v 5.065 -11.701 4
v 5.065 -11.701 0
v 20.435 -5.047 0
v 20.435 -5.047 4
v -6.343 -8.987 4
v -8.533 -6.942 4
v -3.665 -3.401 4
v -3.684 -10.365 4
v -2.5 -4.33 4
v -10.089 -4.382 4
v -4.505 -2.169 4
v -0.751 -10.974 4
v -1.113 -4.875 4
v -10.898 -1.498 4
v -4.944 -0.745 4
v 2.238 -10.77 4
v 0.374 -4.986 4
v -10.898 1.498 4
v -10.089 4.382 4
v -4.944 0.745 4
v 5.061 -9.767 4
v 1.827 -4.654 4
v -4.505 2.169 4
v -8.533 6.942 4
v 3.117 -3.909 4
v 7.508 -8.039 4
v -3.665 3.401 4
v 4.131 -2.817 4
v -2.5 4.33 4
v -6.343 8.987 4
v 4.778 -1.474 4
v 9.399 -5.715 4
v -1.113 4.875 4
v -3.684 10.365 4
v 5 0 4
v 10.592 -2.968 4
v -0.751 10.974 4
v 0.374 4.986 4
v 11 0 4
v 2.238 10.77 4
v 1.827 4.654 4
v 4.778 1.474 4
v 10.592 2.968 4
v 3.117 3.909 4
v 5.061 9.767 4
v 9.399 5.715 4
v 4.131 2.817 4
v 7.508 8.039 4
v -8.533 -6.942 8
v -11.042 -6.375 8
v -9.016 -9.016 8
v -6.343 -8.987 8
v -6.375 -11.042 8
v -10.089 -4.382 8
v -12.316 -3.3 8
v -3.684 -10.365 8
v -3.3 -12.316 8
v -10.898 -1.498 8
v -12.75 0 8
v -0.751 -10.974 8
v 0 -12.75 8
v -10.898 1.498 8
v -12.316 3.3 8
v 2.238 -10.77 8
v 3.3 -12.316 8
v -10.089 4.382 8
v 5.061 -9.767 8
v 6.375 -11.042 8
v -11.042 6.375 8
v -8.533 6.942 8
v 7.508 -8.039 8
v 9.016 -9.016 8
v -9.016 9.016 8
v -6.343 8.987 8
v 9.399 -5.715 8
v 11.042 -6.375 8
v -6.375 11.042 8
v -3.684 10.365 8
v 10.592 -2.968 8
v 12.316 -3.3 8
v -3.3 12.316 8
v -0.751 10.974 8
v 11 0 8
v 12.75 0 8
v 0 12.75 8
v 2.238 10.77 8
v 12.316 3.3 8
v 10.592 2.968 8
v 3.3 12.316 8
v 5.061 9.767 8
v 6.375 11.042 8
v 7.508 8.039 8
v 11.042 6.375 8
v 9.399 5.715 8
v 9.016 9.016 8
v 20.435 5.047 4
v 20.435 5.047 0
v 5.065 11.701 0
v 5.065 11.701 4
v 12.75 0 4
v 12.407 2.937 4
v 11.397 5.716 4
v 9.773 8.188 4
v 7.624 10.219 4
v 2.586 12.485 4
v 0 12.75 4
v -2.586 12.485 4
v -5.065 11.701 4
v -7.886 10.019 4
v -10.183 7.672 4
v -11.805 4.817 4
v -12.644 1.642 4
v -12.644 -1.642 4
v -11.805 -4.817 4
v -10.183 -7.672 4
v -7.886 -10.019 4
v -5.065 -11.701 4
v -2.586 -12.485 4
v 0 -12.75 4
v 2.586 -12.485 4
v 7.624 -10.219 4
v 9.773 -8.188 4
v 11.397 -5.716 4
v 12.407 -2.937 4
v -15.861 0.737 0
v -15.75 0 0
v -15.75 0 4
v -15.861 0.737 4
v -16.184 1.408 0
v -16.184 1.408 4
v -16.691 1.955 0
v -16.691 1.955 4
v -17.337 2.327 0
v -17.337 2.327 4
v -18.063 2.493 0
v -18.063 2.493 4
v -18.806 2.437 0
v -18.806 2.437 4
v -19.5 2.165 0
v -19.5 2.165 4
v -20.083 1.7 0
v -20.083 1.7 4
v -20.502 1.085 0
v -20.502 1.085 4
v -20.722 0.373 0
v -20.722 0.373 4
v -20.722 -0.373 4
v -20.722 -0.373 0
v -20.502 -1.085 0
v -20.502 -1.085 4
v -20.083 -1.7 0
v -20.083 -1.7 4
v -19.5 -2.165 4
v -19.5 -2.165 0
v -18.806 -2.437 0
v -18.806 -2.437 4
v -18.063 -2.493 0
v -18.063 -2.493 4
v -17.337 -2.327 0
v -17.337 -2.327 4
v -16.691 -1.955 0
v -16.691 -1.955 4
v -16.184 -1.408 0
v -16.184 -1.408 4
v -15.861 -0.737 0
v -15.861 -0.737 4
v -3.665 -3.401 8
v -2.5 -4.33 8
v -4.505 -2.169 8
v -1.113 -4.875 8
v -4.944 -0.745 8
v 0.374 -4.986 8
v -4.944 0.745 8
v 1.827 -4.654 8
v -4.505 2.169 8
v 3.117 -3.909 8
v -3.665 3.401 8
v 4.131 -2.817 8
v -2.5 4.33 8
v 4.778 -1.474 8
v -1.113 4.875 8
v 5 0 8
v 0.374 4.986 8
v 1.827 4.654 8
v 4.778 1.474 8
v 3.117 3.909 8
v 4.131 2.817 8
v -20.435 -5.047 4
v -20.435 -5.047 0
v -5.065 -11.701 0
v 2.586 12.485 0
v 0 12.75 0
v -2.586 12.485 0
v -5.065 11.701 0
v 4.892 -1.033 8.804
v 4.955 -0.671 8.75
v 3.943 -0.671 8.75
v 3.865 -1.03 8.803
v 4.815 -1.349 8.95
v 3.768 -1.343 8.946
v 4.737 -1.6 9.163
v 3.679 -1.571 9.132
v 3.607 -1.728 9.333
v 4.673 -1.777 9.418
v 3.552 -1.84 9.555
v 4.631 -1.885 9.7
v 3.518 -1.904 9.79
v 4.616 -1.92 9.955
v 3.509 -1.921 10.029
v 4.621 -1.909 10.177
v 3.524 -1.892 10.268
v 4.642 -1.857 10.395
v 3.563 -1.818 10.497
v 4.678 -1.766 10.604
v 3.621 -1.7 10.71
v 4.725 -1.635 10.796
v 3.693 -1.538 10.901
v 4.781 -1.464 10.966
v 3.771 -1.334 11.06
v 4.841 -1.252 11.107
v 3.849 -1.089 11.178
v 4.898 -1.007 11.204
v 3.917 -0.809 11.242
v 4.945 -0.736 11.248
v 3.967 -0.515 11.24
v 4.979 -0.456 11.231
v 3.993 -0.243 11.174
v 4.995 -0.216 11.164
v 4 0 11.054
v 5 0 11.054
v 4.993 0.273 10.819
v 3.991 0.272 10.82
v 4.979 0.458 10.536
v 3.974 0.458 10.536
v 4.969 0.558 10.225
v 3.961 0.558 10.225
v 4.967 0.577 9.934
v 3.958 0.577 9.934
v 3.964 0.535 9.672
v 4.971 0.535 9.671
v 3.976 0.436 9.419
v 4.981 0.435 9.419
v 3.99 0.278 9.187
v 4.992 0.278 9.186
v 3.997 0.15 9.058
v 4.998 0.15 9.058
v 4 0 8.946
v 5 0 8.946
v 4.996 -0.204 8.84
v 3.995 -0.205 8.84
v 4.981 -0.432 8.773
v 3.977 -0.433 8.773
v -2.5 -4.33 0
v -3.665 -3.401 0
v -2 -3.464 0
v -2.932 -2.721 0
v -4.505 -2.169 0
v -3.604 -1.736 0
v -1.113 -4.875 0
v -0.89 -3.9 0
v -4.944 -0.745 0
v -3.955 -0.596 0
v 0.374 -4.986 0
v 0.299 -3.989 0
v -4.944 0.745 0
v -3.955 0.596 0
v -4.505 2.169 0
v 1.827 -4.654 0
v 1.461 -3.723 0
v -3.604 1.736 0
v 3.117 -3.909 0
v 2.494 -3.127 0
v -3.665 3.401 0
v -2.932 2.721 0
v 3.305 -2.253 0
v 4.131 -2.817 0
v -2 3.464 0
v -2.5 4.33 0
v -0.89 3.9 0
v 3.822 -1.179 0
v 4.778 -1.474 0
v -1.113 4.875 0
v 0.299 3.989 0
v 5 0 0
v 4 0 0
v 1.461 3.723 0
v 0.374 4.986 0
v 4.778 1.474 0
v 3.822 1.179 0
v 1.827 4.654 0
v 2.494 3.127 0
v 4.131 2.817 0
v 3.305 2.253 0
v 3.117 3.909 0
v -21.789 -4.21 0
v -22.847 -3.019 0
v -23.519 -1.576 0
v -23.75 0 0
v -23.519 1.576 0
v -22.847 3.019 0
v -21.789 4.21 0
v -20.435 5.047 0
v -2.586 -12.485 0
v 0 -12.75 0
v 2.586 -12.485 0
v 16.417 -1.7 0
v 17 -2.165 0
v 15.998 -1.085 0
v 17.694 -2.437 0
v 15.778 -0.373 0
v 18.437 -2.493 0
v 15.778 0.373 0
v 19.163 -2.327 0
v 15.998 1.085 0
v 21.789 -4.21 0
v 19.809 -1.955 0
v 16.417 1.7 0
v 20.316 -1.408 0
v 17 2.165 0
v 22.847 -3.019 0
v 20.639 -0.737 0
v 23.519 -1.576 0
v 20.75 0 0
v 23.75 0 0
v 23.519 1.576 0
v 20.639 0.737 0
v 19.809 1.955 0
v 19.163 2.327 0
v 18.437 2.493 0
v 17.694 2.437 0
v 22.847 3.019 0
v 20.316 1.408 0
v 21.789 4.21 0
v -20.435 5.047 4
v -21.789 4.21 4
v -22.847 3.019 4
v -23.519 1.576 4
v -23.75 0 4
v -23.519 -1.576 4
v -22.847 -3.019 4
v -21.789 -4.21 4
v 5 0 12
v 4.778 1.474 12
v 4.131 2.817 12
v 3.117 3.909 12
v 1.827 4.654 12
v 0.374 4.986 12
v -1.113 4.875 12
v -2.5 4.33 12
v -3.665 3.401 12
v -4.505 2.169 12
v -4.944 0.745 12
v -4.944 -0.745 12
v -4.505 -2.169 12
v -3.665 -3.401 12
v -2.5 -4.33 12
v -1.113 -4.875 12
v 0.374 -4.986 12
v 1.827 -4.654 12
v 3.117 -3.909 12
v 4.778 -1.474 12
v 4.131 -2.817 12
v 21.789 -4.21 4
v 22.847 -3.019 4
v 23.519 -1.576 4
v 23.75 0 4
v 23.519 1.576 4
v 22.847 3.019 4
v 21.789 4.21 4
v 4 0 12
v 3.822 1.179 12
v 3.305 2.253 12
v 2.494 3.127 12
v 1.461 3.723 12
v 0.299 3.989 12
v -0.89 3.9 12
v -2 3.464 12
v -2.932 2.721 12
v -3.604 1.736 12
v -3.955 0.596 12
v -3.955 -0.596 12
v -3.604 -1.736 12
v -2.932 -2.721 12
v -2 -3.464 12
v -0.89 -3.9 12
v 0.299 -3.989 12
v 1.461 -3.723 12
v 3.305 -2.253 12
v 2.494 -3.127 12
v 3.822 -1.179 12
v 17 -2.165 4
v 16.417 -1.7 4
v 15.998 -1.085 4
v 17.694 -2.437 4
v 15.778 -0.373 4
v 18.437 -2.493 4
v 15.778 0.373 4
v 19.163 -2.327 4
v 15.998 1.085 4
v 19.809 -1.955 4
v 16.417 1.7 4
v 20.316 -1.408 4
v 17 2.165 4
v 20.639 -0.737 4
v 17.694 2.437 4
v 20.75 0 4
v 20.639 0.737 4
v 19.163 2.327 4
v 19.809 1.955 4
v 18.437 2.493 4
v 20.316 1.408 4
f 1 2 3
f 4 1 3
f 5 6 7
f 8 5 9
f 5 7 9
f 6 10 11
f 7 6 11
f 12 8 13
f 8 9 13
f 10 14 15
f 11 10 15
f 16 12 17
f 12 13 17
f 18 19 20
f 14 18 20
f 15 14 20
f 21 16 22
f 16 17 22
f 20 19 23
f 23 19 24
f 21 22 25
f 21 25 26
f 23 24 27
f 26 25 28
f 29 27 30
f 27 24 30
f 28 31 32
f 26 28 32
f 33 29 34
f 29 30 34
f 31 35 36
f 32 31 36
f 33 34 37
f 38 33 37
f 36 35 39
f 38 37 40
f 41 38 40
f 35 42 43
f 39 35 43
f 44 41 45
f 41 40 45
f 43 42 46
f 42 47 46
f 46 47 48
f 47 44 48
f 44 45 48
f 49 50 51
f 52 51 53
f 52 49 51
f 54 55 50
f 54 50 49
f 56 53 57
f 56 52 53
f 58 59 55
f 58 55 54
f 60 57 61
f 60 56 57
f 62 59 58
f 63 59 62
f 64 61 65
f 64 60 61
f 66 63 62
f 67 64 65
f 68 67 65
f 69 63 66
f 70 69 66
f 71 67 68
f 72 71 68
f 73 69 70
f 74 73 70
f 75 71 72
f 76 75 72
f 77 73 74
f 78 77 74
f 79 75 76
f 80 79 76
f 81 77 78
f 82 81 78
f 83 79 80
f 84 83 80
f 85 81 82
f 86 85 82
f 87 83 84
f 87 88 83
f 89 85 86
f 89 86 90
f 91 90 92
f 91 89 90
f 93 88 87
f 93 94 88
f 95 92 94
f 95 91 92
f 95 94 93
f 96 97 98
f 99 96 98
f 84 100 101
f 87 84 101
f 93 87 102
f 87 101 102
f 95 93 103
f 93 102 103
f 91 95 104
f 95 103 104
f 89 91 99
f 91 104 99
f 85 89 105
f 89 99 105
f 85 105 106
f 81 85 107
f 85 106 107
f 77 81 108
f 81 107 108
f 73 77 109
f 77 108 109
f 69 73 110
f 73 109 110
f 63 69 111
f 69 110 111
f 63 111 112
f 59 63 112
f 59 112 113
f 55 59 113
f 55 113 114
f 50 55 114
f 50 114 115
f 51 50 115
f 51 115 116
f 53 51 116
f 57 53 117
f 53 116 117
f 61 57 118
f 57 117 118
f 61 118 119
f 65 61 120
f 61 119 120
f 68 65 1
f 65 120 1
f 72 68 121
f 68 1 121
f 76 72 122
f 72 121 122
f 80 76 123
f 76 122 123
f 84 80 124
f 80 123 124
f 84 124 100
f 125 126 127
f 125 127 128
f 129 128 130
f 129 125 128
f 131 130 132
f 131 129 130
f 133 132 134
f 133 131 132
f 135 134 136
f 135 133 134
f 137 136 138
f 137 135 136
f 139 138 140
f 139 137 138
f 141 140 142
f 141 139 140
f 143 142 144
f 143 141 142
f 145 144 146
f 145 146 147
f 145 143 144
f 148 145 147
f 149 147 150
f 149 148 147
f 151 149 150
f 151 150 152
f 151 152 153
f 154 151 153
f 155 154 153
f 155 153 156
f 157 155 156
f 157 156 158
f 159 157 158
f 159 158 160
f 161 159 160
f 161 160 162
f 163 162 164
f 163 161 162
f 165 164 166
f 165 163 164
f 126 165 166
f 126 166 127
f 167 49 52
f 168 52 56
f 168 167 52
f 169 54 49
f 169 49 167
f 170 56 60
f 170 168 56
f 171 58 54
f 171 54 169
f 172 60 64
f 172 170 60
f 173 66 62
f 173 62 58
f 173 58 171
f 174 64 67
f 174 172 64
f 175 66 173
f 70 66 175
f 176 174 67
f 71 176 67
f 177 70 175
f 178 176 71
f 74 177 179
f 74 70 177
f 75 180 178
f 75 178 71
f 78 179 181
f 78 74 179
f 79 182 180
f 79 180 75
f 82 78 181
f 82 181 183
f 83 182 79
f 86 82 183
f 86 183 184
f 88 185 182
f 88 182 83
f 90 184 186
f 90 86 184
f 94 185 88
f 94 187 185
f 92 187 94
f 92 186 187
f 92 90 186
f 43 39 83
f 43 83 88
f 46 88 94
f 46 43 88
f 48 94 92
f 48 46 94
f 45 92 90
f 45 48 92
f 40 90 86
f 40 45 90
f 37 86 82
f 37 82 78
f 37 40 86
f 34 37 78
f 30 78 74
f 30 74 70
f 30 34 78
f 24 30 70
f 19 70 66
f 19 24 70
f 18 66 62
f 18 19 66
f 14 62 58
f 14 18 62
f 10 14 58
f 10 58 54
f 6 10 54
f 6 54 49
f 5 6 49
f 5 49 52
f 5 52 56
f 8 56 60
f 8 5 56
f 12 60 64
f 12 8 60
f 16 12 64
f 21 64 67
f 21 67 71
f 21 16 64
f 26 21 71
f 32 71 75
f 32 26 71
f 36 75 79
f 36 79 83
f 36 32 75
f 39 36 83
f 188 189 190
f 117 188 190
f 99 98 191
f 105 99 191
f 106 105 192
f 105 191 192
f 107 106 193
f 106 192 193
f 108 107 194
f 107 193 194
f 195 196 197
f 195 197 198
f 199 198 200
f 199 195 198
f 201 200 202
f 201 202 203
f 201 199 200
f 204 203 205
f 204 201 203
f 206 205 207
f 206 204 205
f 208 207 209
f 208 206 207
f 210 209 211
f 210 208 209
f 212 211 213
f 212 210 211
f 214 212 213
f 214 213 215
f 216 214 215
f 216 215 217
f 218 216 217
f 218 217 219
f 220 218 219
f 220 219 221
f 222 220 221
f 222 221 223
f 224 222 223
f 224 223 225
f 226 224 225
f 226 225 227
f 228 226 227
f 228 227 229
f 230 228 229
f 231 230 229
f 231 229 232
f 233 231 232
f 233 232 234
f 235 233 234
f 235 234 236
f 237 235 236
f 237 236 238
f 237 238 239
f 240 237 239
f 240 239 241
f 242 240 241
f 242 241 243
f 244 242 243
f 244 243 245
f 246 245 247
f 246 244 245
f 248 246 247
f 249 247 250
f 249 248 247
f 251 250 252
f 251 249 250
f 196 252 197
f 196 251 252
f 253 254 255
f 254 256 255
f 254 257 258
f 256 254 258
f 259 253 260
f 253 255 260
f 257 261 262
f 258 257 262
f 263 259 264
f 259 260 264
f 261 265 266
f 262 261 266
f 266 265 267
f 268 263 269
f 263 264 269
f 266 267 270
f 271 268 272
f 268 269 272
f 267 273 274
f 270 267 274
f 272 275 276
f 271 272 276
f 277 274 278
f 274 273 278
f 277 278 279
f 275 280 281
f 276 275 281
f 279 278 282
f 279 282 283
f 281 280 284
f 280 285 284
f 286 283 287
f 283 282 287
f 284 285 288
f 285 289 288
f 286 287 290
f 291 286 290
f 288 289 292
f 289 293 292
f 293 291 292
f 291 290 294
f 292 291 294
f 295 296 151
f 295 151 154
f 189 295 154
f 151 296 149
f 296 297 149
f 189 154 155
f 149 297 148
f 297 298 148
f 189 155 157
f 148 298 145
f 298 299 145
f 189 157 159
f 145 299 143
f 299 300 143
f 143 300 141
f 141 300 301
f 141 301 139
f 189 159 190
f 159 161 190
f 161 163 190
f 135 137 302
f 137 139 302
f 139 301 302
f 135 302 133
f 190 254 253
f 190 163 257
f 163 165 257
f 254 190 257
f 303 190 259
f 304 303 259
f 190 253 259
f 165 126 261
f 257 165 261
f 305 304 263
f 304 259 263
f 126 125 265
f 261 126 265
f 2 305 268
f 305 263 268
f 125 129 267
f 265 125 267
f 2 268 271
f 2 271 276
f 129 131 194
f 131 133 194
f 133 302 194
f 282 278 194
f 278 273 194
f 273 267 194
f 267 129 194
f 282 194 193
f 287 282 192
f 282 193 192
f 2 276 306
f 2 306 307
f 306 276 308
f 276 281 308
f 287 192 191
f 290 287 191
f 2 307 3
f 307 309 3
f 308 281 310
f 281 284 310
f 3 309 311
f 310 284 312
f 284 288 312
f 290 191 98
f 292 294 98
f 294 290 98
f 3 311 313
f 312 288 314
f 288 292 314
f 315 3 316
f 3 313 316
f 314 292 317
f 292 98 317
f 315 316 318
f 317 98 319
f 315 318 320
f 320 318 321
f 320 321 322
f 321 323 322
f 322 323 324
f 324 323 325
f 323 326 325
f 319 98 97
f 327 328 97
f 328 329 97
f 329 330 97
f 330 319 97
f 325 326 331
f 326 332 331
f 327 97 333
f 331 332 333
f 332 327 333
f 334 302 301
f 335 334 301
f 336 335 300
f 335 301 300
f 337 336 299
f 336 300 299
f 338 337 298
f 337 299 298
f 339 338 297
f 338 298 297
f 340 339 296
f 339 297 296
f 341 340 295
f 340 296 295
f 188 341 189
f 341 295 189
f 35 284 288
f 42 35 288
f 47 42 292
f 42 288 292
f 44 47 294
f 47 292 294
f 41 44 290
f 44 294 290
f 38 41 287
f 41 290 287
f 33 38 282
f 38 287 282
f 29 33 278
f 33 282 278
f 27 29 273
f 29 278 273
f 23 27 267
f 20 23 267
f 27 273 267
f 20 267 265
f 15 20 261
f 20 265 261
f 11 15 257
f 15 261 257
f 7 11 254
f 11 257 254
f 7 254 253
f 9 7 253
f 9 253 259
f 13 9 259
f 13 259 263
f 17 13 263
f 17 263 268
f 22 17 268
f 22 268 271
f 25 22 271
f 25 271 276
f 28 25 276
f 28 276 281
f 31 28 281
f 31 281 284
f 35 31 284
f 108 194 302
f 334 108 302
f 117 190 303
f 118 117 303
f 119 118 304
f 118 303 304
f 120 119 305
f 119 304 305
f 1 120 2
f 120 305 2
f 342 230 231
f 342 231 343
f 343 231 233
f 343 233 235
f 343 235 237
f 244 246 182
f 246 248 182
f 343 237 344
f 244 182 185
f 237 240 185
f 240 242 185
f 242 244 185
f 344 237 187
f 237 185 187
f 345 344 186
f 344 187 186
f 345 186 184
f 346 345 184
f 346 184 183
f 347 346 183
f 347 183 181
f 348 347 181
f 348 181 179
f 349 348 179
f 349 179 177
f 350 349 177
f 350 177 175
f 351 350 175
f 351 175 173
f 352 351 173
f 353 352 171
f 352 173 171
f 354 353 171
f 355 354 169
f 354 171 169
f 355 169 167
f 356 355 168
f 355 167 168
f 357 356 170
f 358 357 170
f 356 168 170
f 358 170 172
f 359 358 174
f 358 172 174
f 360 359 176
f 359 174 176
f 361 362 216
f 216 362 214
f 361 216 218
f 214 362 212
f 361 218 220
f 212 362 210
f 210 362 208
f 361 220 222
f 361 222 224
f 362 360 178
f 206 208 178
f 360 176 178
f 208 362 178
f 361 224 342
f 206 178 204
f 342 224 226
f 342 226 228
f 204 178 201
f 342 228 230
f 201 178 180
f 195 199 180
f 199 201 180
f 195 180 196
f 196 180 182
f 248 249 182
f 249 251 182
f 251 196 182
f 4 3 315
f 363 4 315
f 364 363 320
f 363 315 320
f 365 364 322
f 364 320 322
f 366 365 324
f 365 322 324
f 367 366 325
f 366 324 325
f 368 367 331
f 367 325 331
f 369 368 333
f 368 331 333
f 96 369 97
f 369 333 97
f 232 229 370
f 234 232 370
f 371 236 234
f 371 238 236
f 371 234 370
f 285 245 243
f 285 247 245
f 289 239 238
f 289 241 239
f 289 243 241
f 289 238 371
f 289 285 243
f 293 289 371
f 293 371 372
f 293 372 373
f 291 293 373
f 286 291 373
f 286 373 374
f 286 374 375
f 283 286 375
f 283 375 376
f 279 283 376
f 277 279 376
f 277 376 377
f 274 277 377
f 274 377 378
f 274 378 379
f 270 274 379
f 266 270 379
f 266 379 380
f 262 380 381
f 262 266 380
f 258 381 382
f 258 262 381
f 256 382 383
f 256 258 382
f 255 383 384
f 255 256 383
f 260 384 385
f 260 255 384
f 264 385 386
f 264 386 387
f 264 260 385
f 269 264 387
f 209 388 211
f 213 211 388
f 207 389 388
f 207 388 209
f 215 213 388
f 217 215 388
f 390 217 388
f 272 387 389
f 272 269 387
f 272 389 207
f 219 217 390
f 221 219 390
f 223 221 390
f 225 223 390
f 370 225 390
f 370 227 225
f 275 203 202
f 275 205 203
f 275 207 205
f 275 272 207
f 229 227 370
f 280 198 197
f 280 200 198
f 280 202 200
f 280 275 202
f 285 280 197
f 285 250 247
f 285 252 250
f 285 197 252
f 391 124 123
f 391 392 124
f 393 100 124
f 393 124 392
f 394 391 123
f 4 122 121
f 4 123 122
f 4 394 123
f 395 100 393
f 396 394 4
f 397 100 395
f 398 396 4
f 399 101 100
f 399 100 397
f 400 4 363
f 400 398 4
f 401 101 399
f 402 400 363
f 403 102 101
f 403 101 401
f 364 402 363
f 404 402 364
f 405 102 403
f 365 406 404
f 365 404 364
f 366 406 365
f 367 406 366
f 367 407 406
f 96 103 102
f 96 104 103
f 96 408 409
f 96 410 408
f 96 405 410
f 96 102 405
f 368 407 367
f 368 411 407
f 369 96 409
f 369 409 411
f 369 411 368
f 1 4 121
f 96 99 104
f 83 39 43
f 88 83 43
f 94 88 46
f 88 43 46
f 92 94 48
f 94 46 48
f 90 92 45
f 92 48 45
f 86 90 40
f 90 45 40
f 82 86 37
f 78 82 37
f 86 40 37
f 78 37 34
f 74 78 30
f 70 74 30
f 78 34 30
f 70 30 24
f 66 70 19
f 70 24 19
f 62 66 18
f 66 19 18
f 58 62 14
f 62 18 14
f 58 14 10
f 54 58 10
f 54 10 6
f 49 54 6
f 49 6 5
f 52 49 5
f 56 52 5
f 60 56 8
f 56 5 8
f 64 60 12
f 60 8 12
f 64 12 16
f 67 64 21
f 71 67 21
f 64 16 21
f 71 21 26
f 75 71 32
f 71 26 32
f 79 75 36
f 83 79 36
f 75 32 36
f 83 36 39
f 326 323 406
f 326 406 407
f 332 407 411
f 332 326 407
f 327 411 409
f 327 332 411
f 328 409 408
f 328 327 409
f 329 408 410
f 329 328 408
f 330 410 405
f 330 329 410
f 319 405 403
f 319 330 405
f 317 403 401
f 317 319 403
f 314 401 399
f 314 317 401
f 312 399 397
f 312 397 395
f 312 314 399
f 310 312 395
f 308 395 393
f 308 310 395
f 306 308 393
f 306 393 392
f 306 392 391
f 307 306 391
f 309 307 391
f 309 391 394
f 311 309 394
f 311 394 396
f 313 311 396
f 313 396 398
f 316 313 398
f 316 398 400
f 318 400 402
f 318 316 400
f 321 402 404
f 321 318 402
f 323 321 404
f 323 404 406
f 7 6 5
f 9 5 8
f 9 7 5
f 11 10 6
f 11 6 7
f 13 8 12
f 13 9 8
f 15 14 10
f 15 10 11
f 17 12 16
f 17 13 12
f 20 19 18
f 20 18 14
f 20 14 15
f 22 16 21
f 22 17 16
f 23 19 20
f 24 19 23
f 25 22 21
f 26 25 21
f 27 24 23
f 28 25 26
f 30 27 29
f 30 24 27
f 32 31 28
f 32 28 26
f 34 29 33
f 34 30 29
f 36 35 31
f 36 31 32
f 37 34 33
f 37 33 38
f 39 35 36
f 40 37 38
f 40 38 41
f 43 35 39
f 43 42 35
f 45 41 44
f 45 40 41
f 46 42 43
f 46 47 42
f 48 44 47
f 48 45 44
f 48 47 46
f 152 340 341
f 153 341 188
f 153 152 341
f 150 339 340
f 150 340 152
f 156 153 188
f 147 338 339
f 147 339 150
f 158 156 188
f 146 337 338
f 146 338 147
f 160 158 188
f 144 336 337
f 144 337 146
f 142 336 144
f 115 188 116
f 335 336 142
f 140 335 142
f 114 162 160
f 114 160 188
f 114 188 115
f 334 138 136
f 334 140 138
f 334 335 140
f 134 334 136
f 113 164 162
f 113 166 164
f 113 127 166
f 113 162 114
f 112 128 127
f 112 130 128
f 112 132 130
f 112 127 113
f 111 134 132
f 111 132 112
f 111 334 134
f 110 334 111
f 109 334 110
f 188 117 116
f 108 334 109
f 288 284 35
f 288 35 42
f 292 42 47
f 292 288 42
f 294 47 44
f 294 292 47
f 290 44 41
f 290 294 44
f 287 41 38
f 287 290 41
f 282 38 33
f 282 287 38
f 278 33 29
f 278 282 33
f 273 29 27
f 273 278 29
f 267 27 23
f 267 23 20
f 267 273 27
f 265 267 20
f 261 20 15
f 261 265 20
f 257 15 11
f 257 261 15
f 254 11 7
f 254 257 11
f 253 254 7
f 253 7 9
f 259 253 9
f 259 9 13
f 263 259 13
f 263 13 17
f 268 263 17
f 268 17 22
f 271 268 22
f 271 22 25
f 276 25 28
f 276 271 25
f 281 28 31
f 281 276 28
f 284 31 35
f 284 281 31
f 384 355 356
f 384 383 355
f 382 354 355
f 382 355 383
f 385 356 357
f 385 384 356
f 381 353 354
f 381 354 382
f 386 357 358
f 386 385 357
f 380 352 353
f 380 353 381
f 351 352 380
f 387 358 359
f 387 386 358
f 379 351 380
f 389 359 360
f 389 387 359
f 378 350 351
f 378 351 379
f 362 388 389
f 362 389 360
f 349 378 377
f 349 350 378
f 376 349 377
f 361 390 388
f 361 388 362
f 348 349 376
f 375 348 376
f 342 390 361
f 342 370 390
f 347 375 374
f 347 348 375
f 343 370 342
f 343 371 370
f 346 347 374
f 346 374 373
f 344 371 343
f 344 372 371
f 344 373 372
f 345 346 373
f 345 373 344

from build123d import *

# Parameters (mm, degrees)
CROQUIS1_R              = 5
CROQUIS1_R_2            = 2.5
SALIENTE_EXTRUIR1_DEPTH = 4
CROQUIS2_R              = 12.75
CROQUIS2_R_2            = 11
SALIENTE_EXTRUIR2_DEPTH = 4
CROQUIS3_R              = 11
CROQUIS3_R_2            = 5
SALIENTE_EXTRUIR3_DEPTH = 4
CROQUIS5_R              = 5
CROQUIS5_R_2            = 4
SALIENTE_EXTRUIR4_DEPTH = 12


with BuildPart() as part:
    # Croquis1 → Saliente-Extruir1 (new body)
    with BuildSketch(Plane.XY):
        with BuildLine():
            Line((-20.434931507, -5.047382917), (-5.065068493, -11.700751307))
            ThreePointArc((-5.065068493, -11.700751307), (0, -12.75), (5.065068493, -11.700751307))
            Line((5.065068493, -11.700751307), (20.434931507, -5.047382917))
            ThreePointArc((20.434931507, -5.047382917), (23.75, 0), (20.434931507, 5.047382917))
            Line((20.434931507, 5.047382917), (5.065068493, 11.700751307))
            ThreePointArc((5.065068493, 11.700751307), (0, 12.75), (-5.065068493, 11.700751307))
            Line((-5.065068493, 11.700751307), (-20.434931507, 5.047382917))
            ThreePointArc((-20.434931507, 5.047382917), (-23.75, 0), (-20.434931507, -5.047382917))
        make_face()
        Circle(CROQUIS1_R, mode=Mode.SUBTRACT)
        with Locations((-18.25, 0)):
            Circle(CROQUIS1_R_2, mode=Mode.SUBTRACT)
        with Locations((18.25, 0)):
            Circle(CROQUIS1_R_2, mode=Mode.SUBTRACT)
    extrude(amount=SALIENTE_EXTRUIR1_DEPTH)

    # Croquis2 → Saliente-Extruir2 (add)
    with BuildSketch(Plane.XY.offset(4)):
        Circle(CROQUIS2_R)
        Circle(CROQUIS2_R_2, mode=Mode.SUBTRACT)
    extrude(amount=SALIENTE_EXTRUIR2_DEPTH)


with BuildPart() as body_2:
    # Croquis3 → Saliente-Extruir3 (new body)
    with BuildSketch(Plane.XY.offset(4)):
        Circle(CROQUIS3_R)
        Circle(CROQUIS3_R_2, mode=Mode.SUBTRACT)
    extrude(amount=SALIENTE_EXTRUIR3_DEPTH)


with BuildPart() as body_3:
    # Croquis5 → Saliente-Extruir4 (new body)
    with BuildSketch(Plane.XY):
        Circle(CROQUIS5_R)
        Circle(CROQUIS5_R_2, mode=Mode.SUBTRACT)
    extrude(amount=SALIENTE_EXTRUIR4_DEPTH)


with BuildPart() as body_2_1:
    add(body_2.part)

    # Combinar1: union body 3
    add(body_3.part)

    # Sketch2 → M3 Tapped Hole1 (revolve, cut)
    with BuildSketch(Plane(origin=(5, -0.671278383, 10), x_dir=(0, 0, -1), z_dir=(0, 1, 0))):
        Polygon((0, 0), (0, 6.251075774), (1.25, 5.5), (1.25, 0), align=None)
    revolve(axis=Axis((11.35, -0.671278383, 10), (-1, 0, 0)), mode=Mode.SUBTRACT)


solid = Compound([part.part, body_2_1.part])
